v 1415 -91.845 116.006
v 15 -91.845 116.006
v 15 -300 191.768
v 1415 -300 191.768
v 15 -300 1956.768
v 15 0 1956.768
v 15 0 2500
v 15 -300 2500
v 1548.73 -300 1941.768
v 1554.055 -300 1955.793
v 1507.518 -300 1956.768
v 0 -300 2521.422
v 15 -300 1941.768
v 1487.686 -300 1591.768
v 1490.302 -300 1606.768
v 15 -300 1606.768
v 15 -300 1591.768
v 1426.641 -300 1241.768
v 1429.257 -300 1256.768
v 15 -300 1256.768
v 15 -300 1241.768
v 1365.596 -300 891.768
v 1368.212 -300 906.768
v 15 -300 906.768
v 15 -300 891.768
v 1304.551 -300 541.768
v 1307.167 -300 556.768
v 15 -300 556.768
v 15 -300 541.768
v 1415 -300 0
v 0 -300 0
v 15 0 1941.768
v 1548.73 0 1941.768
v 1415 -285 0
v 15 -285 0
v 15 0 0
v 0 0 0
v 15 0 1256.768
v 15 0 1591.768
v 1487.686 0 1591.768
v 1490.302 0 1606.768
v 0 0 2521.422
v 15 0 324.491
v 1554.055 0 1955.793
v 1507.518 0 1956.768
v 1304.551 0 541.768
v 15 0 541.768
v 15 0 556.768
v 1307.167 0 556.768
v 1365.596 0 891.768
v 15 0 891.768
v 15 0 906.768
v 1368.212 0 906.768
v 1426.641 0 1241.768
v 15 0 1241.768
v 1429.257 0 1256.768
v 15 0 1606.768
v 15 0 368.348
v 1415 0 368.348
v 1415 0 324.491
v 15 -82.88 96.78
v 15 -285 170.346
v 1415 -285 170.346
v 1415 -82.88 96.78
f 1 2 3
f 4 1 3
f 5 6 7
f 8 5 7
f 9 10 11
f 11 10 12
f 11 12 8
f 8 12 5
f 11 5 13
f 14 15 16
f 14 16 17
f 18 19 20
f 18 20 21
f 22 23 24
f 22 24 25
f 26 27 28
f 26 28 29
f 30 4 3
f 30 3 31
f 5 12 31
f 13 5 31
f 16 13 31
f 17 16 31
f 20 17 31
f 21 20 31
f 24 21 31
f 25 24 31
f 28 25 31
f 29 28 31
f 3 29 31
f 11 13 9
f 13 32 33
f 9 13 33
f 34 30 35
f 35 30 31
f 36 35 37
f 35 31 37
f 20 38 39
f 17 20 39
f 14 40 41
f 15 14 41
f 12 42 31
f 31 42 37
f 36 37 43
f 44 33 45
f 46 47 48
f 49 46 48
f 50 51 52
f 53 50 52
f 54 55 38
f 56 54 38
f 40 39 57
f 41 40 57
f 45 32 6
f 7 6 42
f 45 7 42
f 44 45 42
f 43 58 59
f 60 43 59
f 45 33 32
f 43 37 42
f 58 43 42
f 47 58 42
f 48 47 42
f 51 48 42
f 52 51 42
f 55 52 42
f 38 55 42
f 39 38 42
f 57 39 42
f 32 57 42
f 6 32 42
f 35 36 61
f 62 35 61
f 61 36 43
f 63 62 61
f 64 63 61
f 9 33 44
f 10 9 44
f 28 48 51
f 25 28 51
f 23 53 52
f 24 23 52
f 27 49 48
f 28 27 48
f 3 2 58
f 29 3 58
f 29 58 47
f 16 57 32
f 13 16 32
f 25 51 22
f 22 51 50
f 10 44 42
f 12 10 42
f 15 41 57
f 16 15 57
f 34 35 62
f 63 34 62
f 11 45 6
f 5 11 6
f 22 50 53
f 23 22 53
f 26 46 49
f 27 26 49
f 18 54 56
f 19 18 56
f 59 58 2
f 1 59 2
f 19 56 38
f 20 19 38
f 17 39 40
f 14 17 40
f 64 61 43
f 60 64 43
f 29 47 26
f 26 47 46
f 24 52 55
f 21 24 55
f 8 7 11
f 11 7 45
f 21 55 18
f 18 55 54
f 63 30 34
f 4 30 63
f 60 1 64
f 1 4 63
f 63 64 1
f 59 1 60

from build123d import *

# Parameters (mm, degrees)
F1_DEPTH = 300
F3_DEPTH = 1400


with BuildPart() as f1:
    # F0 (on Front) → F1 (new body)
    with BuildSketch(Plane.XZ):
        Polygon((0, 0), (15, 0), (15, 541.767756), (15, 556.767756), (15, 891.767756), (15, 906.767756), (15, 1241.767756), (15, 1256.767756), (15, 1591.767756), (15, 1606.767756), (15, 1941.767756), (15, 1956.767756), (15, 2500), (1507.518325, 1956.767756), (1548.730486, 1941.767756), (1554.054528, 1955.792629), (0, 2521.42222), align=None)
        Polygon((15, 556.767756), (15, 541.767756), (1304.550659, 541.767756), (1307.166871, 556.767756), align=None)
        Polygon((15, 906.767756), (15, 891.767756), (1365.595615, 891.767756), (1368.211828, 906.767756), align=None)
        Polygon((15, 1941.767756), (1548.730486, 1941.767756), (1507.518325, 1956.767756), (15, 1956.767756), align=None)
        Polygon((15, 1256.767756), (15, 1241.767756), (1426.640572, 1241.767756), (1429.256785, 1256.767756), align=None)
        Polygon((1490.301742, 1606.767756), (15, 1606.767756), (15, 1591.767756), (1487.685529, 1591.767756), align=None)
    extrude(amount=F1_DEPTH)

    # F2 (on face) → F3 (join)
    with BuildSketch(Plane.YZ.offset(15)):
        Polygon((-91.845083, 116.005562), (-300, 191.767756), (-300, 0), (-285, 0), (-285, 170.345536), (-82.879996, 96.77987), (0, 324.490787), (0, 368.347853), align=None)
    extrude(amount=F3_DEPTH)


solid = f1.part
